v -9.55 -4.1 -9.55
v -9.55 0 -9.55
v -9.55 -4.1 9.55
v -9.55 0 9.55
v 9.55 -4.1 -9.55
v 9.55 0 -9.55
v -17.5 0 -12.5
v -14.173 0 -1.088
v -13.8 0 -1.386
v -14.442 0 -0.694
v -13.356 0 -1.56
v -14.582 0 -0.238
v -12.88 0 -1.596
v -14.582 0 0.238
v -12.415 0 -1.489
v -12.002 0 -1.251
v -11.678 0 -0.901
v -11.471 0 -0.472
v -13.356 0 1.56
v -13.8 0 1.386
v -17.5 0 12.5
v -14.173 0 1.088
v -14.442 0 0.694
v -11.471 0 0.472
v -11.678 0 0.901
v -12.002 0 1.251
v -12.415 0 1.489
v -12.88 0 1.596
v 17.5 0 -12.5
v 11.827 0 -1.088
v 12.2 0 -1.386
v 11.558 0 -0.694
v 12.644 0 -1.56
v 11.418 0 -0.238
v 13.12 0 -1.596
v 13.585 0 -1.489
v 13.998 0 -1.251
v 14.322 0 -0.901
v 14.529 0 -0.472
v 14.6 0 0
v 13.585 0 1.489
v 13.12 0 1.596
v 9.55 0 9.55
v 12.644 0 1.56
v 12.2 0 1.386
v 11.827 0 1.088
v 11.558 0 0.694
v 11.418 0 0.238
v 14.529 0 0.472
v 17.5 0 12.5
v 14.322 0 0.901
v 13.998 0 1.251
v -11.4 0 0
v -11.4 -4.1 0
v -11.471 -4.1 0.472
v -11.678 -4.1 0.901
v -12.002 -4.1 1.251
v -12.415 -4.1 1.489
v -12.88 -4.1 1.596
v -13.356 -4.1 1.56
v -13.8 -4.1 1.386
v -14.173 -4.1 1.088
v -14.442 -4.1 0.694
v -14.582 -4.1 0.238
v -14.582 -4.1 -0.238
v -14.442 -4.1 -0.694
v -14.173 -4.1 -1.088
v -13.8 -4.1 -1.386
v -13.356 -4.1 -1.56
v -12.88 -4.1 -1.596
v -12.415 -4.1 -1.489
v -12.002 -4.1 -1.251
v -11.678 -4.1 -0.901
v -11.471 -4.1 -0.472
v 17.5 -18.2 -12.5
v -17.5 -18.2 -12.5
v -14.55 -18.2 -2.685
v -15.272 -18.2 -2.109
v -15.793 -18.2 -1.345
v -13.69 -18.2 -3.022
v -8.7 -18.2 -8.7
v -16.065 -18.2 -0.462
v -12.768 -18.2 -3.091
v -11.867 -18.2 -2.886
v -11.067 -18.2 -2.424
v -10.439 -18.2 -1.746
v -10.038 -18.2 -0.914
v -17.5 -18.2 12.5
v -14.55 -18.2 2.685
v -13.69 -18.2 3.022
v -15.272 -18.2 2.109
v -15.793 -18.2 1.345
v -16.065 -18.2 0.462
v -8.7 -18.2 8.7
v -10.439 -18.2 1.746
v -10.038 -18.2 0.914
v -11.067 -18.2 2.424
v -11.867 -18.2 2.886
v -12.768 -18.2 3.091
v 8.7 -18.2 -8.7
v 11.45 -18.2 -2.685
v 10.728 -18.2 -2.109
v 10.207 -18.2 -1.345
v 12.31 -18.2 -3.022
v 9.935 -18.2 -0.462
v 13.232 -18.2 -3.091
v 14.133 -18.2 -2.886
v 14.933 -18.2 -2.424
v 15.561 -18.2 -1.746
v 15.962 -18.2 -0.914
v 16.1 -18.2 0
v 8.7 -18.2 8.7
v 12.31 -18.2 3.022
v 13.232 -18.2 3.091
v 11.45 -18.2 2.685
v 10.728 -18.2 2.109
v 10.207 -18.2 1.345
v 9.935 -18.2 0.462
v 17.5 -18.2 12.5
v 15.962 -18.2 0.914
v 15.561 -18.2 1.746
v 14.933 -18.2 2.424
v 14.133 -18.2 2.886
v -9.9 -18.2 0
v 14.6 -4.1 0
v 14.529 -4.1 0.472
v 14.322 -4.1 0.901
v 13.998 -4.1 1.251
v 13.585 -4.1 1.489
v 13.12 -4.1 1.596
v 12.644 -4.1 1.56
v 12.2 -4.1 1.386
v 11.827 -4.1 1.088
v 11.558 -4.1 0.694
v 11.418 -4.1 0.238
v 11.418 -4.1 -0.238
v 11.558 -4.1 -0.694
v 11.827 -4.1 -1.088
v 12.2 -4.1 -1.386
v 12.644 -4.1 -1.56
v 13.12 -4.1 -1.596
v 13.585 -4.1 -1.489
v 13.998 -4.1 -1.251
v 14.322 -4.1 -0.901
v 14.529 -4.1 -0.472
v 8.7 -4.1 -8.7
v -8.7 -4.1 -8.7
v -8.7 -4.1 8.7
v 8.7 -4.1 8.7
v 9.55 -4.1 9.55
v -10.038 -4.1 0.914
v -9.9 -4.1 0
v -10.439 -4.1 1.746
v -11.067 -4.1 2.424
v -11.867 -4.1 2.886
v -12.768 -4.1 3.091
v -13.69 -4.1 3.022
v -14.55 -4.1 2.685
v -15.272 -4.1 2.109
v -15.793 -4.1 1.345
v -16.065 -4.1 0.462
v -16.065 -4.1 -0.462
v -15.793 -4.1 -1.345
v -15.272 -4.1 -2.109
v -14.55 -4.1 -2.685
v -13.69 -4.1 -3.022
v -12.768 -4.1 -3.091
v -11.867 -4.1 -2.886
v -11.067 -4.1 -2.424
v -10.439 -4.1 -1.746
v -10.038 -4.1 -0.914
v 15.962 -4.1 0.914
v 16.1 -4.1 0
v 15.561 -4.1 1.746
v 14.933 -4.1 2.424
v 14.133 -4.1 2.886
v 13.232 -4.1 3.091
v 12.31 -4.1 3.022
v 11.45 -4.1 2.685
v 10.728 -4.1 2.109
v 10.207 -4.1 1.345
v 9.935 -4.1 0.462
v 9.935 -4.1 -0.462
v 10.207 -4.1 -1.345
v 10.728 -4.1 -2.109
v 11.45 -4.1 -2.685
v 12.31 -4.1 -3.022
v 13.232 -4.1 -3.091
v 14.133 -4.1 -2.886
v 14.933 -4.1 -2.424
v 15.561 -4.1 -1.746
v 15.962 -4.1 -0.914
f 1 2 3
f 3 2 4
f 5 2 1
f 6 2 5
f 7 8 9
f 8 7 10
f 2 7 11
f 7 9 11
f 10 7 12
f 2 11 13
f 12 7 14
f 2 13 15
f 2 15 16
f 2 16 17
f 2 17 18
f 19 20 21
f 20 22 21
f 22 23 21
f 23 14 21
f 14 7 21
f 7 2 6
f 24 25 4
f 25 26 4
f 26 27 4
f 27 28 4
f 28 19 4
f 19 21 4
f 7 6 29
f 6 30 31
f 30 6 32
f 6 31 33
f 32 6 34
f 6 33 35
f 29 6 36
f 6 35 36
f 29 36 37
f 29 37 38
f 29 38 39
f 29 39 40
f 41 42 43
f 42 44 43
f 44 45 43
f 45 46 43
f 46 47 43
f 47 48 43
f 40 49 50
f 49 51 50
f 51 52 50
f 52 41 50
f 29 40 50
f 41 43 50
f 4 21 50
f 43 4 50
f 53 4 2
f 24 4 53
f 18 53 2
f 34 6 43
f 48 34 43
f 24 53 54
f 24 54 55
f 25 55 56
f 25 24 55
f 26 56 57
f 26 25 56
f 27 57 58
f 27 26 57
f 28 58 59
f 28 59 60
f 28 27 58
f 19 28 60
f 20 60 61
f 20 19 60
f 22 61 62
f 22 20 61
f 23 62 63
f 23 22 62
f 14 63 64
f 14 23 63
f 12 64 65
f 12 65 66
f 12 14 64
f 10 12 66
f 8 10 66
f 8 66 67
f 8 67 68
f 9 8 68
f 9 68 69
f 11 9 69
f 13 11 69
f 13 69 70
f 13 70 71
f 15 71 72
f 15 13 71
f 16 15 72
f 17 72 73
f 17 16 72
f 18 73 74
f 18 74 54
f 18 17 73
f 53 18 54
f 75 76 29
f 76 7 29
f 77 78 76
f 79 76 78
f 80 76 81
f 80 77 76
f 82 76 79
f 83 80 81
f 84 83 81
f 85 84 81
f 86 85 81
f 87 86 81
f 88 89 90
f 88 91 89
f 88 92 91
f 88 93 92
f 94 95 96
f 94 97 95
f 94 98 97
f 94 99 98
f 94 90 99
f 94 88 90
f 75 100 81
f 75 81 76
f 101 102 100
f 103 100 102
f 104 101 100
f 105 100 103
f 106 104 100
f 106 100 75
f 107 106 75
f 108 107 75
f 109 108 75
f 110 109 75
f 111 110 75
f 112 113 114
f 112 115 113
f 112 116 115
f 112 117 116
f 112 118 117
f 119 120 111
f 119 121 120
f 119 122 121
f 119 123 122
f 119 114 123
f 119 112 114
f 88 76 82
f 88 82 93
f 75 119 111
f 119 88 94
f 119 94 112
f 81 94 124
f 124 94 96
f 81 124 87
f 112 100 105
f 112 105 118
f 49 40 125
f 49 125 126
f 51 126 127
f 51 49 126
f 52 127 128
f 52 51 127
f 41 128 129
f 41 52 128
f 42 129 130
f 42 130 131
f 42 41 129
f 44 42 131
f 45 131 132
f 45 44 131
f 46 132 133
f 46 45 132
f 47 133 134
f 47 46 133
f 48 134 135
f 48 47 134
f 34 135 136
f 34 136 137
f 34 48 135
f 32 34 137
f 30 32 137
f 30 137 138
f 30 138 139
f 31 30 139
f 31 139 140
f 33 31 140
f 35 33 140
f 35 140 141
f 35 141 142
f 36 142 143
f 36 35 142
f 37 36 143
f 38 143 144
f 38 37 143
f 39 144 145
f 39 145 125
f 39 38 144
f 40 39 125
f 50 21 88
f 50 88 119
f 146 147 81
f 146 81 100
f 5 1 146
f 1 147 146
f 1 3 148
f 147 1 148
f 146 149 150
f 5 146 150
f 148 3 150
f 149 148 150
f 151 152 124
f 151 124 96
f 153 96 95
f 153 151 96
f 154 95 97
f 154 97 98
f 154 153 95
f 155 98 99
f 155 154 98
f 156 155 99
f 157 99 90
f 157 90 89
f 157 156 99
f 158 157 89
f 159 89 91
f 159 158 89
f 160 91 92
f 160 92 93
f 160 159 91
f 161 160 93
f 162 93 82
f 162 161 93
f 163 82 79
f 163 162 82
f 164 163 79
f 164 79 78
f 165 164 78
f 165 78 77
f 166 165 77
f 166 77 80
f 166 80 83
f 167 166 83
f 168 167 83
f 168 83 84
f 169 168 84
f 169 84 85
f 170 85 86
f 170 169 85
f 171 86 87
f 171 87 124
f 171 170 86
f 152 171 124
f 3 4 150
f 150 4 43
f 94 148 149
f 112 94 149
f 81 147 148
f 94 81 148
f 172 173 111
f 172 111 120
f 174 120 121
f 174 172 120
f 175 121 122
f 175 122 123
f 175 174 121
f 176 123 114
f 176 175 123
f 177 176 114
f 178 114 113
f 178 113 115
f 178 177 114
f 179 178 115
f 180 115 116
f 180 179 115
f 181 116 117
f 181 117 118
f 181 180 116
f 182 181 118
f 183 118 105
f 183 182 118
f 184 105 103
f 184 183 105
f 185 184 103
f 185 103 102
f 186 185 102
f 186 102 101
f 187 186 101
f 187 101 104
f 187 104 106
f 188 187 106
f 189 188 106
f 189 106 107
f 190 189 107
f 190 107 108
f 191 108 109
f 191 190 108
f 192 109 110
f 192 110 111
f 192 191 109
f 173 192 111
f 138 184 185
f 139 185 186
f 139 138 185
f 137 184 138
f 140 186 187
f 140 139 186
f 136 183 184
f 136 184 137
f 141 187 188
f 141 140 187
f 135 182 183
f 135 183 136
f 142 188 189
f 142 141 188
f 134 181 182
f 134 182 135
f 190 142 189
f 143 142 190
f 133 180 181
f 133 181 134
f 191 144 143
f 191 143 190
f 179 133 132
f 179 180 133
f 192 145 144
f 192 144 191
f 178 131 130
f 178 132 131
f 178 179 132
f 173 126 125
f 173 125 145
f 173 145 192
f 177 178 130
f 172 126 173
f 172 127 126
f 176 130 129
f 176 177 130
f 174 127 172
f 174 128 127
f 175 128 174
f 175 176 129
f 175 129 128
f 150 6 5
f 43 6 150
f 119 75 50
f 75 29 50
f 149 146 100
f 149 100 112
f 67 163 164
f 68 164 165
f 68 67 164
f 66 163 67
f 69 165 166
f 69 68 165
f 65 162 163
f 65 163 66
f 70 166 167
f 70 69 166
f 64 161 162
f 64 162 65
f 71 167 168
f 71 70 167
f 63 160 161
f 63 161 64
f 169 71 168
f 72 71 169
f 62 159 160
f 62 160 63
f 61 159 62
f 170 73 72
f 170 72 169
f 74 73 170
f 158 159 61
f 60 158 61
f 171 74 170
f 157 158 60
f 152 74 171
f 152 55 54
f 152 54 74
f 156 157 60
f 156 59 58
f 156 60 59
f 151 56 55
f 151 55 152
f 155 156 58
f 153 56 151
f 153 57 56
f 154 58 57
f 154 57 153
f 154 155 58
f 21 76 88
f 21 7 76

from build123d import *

# Parameters (mm, degrees)
F0_W     = 35
F0_H     = 25
F0_R     = 1.6
F0_W_2   = 19.1
F0_H_2   = 19.1
F1_DEPTH = 4.1
F2_W     = 35
F2_H     = 25
F2_R     = 3.1
F2_W_2   = 17.4
F2_H_2   = 17.4
F3_DEPTH = 14.1


with BuildPart() as f1:
    # F0 (on Front) → F1 (new body)
    with BuildSketch(Plane.XZ):
        Rectangle(F0_W, F0_H)
        with Locations((-13, 0)):
            Circle(F0_R, mode=Mode.SUBTRACT)
        Rectangle(F0_W_2, F0_H_2, mode=Mode.SUBTRACT)
        with Locations((13, 0)):
            Circle(F0_R, mode=Mode.SUBTRACT)
    extrude(amount=F1_DEPTH)

    # F2 (on face) → F3 (join)
    with BuildSketch(Plane.XZ.offset(4.1)):
        Rectangle(F2_W, F2_H)
        with Locations((-13, 0)):
            Circle(F2_R, mode=Mode.SUBTRACT)
        Rectangle(F2_W_2, F2_H_2, mode=Mode.SUBTRACT)
        with Locations((13, 0)):
            Circle(F2_R, mode=Mode.SUBTRACT)
    extrude(amount=F3_DEPTH)


solid = f1.part
